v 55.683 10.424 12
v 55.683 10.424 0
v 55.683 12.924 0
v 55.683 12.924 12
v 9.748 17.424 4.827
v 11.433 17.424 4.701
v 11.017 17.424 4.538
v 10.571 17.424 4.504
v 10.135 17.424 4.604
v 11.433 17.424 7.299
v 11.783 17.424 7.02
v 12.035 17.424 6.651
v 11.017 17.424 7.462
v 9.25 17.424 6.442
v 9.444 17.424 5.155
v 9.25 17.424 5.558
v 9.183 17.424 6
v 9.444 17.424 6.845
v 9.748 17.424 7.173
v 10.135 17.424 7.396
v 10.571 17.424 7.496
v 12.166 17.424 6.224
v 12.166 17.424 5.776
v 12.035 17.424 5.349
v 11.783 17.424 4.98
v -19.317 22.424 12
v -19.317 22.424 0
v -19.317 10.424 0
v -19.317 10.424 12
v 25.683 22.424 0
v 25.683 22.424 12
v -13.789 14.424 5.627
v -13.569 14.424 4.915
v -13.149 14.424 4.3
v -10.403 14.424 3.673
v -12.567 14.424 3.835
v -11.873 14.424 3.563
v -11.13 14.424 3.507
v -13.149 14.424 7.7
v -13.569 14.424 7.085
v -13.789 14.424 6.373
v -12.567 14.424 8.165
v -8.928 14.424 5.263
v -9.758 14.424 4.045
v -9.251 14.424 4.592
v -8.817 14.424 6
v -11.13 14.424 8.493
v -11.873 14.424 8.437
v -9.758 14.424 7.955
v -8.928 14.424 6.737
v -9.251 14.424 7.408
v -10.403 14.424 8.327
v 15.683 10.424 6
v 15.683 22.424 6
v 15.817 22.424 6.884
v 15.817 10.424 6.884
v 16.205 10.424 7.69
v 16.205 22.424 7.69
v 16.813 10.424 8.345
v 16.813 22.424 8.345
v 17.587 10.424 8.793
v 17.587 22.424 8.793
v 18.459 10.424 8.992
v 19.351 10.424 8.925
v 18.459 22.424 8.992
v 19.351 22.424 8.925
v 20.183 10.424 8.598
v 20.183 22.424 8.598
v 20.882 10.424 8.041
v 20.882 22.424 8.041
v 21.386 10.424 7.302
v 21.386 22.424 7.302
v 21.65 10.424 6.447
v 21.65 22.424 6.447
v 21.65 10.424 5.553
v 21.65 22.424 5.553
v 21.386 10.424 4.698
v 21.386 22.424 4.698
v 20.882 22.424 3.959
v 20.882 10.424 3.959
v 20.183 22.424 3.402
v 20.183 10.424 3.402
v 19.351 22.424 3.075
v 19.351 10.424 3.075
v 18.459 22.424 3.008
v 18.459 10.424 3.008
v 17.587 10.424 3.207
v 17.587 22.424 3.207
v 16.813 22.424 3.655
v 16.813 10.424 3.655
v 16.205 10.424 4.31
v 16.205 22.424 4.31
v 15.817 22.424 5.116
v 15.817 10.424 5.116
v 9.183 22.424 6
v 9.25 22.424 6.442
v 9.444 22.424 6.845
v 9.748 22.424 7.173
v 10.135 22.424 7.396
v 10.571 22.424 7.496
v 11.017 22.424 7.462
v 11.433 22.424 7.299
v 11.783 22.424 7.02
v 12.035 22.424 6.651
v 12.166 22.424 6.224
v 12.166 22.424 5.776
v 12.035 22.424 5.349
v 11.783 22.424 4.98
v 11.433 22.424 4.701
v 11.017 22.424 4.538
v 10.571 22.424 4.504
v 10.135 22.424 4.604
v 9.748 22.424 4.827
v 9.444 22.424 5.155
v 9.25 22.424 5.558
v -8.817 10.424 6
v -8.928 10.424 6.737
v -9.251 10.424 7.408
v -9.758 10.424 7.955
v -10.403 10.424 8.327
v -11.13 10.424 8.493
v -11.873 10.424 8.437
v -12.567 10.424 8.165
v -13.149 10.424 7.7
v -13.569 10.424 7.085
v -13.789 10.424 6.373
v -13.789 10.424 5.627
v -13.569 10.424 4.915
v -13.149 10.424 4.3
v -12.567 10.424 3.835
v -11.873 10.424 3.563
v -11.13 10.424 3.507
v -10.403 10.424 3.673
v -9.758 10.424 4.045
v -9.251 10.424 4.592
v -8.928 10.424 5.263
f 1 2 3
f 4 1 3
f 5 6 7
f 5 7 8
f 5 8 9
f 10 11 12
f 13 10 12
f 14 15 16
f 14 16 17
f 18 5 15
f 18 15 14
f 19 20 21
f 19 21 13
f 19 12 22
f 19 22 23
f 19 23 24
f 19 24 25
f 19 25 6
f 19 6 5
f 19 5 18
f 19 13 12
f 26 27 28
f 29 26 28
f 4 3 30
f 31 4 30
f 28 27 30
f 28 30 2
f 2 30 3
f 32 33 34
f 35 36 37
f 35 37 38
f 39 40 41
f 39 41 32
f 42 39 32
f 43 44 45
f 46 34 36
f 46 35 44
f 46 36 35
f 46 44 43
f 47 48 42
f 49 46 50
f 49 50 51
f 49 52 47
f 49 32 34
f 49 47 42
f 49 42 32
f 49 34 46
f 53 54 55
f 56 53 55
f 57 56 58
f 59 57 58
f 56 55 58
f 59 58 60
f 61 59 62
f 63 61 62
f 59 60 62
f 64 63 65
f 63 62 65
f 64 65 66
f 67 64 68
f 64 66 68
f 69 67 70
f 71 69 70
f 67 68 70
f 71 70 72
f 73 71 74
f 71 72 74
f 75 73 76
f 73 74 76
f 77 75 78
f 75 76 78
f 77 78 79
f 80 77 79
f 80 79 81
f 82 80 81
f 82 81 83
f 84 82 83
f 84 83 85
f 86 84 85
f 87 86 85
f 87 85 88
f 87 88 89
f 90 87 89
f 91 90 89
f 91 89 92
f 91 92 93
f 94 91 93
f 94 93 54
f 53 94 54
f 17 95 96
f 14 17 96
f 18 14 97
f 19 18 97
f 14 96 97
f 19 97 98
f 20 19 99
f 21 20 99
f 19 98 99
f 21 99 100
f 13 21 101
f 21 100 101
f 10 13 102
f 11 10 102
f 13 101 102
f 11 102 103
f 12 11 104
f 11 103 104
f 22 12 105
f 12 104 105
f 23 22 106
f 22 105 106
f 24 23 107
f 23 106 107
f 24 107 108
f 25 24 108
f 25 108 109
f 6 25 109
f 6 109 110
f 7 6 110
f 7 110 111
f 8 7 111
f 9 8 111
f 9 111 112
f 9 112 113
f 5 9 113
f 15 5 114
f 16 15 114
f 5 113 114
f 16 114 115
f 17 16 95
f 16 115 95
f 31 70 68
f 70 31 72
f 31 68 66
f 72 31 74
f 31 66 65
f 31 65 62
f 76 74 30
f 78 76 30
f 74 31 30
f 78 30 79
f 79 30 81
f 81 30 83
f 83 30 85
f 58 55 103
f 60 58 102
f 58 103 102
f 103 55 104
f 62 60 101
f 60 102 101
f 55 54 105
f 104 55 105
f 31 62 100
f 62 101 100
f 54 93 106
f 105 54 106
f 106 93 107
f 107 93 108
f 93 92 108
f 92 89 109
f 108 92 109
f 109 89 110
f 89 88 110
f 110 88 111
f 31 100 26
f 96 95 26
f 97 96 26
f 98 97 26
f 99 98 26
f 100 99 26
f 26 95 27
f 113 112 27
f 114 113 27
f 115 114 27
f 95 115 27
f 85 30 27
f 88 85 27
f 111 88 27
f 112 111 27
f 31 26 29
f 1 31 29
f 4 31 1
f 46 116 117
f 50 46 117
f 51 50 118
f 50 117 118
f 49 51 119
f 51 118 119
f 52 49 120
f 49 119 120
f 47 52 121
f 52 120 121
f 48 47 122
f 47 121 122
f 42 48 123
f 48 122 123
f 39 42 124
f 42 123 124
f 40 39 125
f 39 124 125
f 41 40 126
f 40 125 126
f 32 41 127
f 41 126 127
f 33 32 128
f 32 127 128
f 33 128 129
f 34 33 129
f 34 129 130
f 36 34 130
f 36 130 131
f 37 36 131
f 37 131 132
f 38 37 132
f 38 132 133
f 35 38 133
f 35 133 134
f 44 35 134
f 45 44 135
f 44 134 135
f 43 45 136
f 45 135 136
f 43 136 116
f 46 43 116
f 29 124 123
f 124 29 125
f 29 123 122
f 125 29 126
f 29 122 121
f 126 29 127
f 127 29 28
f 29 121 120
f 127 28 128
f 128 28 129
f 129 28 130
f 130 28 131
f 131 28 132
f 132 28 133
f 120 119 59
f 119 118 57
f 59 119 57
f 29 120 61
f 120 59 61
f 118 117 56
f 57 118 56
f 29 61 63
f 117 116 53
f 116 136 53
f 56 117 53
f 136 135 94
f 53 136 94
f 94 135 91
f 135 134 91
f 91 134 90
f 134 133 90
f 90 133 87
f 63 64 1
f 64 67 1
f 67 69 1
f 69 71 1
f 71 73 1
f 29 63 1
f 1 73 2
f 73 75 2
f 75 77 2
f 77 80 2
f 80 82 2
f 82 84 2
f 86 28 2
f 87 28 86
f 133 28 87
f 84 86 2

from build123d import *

# Parameters (mm, degrees)
F1_DEPTH = 12
F2_R     = 3
F3_DEPTH = 12.001
F4_R     = 2.5
F5_DEPTH = 4
F6_R     = 1.5
F7_DEPTH = 5


with BuildPart() as f1:
    # F0 (on Top) → F1 (new body)
    with BuildSketch(Plane.XY):
        Polygon((25.683252, 22.42391), (-19.316748, 22.42391), (-19.316748, 10.42391), (55.683252, 10.42391), (55.683252, 12.92391), align=None)
    extrude(amount=F1_DEPTH)

    # F2 (on face) → F3 (cut, through all)
    with BuildSketch(Plane(origin=(0, 22.42391, 0), x_dir=(-1, 0, 0), z_dir=(0, 1, 0))):
        with Locations((-18.683252, 6)):
            Circle(F2_R)
    extrude(amount=-F3_DEPTH, mode=Mode.SUBTRACT)

    # F4 (on face) → F5 (cut)
    with BuildSketch(Plane.XZ.offset(-10.42391)):
        with Locations((-11.316748, 6)):
            Circle(F4_R)
    extrude(amount=-F5_DEPTH, mode=Mode.SUBTRACT)

    # F6 (on face) → F7 (cut)
    with BuildSketch(Plane(origin=(0, 22.42391, 0), x_dir=(-1, 0, 0), z_dir=(0, 1, 0))):
        with Locations((-10.683252, 6)):
            Circle(F6_R)
    extrude(amount=-F7_DEPTH, mode=Mode.SUBTRACT)


solid = f1.part
